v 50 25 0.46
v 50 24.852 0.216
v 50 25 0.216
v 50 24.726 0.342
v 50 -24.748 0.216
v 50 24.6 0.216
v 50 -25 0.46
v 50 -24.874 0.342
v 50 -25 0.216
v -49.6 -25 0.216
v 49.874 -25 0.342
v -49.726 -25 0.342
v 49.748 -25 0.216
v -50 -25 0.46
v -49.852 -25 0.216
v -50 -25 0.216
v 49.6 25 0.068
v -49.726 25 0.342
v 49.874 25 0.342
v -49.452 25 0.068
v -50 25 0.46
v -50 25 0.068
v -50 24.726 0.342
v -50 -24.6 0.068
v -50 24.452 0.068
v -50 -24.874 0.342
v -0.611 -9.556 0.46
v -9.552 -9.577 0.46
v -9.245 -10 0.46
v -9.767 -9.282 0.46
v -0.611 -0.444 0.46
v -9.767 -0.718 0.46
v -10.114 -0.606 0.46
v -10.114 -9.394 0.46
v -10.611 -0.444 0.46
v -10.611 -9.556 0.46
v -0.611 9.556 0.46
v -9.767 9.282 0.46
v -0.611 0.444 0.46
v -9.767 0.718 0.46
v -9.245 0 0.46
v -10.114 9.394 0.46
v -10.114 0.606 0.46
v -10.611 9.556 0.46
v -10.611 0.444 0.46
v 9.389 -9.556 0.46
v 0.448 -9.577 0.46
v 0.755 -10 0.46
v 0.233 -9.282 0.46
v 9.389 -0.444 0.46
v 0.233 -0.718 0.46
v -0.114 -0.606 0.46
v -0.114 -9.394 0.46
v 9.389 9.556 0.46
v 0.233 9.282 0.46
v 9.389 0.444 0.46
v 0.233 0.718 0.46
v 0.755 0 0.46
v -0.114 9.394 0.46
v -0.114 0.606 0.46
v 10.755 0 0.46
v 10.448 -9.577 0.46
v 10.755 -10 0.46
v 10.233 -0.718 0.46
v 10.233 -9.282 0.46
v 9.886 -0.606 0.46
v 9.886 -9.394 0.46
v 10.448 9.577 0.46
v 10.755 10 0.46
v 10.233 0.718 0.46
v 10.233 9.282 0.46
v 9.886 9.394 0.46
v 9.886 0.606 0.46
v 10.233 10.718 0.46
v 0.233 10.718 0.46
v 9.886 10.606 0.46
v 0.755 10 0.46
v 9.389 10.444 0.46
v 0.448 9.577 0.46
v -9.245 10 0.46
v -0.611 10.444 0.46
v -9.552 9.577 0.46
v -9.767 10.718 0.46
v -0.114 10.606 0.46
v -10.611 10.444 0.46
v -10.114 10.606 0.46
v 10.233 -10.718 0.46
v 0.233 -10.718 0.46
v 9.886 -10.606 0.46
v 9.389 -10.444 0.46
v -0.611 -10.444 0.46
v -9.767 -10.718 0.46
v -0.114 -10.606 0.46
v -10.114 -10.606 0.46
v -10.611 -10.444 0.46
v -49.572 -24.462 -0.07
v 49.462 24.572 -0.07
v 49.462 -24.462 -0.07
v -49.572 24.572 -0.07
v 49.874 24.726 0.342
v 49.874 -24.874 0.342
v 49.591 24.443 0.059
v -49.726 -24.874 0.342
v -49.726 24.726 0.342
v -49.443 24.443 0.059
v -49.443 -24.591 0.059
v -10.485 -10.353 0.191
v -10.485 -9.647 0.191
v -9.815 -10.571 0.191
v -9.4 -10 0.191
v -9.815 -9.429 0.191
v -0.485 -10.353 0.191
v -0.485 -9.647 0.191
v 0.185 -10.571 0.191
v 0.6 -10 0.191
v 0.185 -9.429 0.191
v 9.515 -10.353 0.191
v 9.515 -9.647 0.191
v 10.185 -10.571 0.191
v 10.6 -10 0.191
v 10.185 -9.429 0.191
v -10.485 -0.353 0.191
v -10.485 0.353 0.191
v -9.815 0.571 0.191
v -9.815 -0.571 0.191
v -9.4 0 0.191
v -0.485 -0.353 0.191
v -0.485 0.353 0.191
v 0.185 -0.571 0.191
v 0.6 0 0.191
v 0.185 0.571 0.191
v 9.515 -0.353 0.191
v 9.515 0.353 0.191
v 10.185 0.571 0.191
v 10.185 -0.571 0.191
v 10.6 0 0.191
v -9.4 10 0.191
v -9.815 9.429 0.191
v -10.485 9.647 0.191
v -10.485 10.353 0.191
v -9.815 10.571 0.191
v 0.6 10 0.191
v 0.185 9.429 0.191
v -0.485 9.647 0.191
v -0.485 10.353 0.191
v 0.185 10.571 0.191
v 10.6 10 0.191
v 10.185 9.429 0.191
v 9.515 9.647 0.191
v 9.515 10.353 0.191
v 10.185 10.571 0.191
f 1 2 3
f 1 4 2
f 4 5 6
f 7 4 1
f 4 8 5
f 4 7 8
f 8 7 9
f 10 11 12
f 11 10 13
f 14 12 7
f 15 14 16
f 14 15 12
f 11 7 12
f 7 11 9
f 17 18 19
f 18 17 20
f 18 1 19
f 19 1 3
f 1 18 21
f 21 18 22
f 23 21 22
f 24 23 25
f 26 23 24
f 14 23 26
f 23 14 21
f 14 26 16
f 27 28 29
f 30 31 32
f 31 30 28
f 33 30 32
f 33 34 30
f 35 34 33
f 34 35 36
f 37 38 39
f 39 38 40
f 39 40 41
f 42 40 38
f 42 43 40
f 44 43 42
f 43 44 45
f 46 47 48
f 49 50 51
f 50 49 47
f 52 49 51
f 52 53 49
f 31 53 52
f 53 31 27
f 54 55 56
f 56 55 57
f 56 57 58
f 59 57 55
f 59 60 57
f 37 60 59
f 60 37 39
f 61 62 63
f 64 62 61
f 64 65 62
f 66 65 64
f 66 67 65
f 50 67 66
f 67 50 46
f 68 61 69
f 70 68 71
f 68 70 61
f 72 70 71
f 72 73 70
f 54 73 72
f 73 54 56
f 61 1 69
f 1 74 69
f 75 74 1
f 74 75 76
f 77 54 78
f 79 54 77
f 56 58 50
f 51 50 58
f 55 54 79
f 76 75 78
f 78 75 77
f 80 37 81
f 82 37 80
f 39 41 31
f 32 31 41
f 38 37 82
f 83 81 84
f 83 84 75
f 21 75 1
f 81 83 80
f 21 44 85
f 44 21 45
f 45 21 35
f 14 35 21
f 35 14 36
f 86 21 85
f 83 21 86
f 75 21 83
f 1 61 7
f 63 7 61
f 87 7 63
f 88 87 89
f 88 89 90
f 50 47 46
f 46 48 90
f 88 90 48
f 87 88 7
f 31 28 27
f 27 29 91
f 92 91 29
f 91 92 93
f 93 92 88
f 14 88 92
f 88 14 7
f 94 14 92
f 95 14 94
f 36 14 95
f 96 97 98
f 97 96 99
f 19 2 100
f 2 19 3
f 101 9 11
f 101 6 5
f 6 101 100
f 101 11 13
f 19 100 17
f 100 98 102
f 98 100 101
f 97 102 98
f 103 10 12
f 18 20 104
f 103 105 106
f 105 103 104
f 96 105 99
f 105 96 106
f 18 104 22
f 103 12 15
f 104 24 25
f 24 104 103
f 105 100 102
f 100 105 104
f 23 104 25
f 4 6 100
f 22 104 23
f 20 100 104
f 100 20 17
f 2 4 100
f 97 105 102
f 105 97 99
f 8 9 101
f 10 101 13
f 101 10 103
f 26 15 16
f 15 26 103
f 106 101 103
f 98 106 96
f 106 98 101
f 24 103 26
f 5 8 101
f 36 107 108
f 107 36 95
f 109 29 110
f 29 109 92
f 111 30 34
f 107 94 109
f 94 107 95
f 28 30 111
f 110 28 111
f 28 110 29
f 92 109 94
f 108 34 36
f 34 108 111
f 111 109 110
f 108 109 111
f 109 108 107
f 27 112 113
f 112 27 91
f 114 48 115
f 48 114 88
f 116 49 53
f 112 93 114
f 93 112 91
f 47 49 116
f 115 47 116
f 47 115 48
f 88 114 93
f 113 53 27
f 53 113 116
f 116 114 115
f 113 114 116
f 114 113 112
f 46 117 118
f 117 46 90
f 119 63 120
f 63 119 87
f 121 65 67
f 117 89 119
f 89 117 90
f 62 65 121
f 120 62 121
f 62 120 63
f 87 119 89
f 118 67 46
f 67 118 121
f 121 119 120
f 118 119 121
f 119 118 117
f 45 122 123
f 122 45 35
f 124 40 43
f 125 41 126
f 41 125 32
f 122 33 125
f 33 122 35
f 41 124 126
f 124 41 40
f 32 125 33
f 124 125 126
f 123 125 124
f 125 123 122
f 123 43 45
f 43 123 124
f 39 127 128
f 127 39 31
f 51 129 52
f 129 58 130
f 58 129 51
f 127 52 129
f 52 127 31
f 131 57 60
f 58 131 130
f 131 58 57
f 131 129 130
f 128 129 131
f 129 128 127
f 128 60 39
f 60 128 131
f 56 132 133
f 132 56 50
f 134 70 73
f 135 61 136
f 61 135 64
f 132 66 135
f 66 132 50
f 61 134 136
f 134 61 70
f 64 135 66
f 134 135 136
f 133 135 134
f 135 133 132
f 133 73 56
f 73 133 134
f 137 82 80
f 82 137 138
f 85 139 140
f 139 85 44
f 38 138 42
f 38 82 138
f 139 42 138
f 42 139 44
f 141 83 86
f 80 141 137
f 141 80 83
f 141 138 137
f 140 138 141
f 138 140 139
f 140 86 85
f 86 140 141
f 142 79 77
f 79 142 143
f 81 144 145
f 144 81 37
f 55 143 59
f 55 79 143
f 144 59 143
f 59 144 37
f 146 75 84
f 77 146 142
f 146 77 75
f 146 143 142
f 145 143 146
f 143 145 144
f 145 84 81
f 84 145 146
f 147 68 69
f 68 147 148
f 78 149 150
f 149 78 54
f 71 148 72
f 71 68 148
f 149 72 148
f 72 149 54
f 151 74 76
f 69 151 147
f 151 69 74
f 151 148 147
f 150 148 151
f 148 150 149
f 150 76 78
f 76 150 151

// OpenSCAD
// Parameters
tape_length = 100; //[50:200:1]
tape_width = 50; //[25:100:1]
tape_thickness = 0.08; //[0.04:0.16:0.01]
corner_radius = 1.0; //[0.5:2.0:0.1]
adhesive_thickness = 0.03; //[0.01:0.08:0.01]
edge_chamfer = 0.2; //[0.05:0.6:0.05]
overlap = 0.5; //[0.2:1.5:0.1]
texture_depth = 0.01; //[0.0:0.03:0.005]
texture_pitch_x = 10; //[5:20:1]
texture_pitch_y = 10; //[5:20:1]
texture_radius = 1.2; //[0.5:2.5:0.1]

// Base shapes
module tape_sheet() {
  cube([tape_length, tape_width, tape_thickness], center=true);
}

module rounded_corners() {
  linear_extrude(height=tape_thickness, center=true) {
    polygon(points=[
      [-tape_length/2 + corner_radius, -tape_width/2],
      [tape_length/2 - corner_radius, -tape_width/2],
      [tape_length/2, -tape_width/2 + corner_radius],
      [tape_length/2, tape_width/2 - corner_radius],
      [tape_length/2 - corner_radius, tape_width/2],
      [-tape_length/2 + corner_radius, tape_width/2],
      [-tape_length/2, tape_width/2 - corner_radius],
      [-tape_length/2, -tape_width/2 + corner_radius]
    ]);
  }
}

module corner_round(x, y) {
  translate([x, y, 0])
    cylinder(r=corner_radius, h=tape_thickness, center=true);
}

module adhesive_layer() {
  translate([0, 0, -tape_thickness/2 - (adhesive_thickness + overlap)/2 + overlap])
    cube([tape_length, tape_width, adhesive_thickness + overlap], center=true);
}

module edge_chamfer_x(pos) {
  translate([pos * (tape_length/2 - edge_chamfer), 0, -adhesive_thickness/2])
    rotate([0, 45, 0])
      cube([edge_chamfer*2, tape_width + edge_chamfer*2, tape_thickness + adhesive_thickness + overlap], center=true);
}

module edge_chamfer_y(pos) {
  translate([0, pos * (tape_width/2 - edge_chamfer), -adhesive_thickness/2])
    rotate([45, 0, 0])
      cube([tape_length + edge_chamfer*2, edge_chamfer*2, tape_thickness + adhesive_thickness + overlap], center=true);
}

module surface_texture_dimple(x, y) {
  translate([x * texture_pitch_x, y * texture_pitch_y, tape_thickness/2 + texture_radius - texture_depth])
    sphere(r=texture_radius, center=true);
}

// Operations
module tape_thickness() {
  union() {
    rounded_corners();
    corner_round(-tape_length/2 + corner_radius, tape_width/2 - corner_radius);
    corner_round(tape_length/2 - corner_radius, tape_width/2 - corner_radius);
    corner_round(-tape_length/2 + corner_radius, -tape_width/2 + corner_radius);
    corner_round(tape_length/2 - corner_radius, -tape_width/2 + corner_radius);
  }
}

module surface_texture() {
  union() {
    surface_texture_dimple(-1, -1);
    surface_texture_dimple(0, -1);
    surface_texture_dimple(1, -1);
    surface_texture_dimple(-1, 0);
    surface_texture_dimple(0, 0);
    surface_texture_dimple(1, 0);
    surface_texture_dimple(-1, 1);
    surface_texture_dimple(0, 1);
    surface_texture_dimple(1, 1);
  }
}

module tape_with_adhesive() {
  union() {
    tape_thickness();
    adhesive_layer();
  }
}

module tape_with_chamfer() {
  difference() {
    tape_with_adhesive();
    edge_chamfer_x(1);
    edge_chamfer_x(-1);
    edge_chamfer_y(1);
    edge_chamfer_y(-1);
  }
}

module tape_final() {
  difference() {
    tape_with_chamfer();
    surface_texture();
  }
}

// Final output
color([0.85, 0.85, 0.8]) // Off-white for aluminum foil tape
tape_final();
